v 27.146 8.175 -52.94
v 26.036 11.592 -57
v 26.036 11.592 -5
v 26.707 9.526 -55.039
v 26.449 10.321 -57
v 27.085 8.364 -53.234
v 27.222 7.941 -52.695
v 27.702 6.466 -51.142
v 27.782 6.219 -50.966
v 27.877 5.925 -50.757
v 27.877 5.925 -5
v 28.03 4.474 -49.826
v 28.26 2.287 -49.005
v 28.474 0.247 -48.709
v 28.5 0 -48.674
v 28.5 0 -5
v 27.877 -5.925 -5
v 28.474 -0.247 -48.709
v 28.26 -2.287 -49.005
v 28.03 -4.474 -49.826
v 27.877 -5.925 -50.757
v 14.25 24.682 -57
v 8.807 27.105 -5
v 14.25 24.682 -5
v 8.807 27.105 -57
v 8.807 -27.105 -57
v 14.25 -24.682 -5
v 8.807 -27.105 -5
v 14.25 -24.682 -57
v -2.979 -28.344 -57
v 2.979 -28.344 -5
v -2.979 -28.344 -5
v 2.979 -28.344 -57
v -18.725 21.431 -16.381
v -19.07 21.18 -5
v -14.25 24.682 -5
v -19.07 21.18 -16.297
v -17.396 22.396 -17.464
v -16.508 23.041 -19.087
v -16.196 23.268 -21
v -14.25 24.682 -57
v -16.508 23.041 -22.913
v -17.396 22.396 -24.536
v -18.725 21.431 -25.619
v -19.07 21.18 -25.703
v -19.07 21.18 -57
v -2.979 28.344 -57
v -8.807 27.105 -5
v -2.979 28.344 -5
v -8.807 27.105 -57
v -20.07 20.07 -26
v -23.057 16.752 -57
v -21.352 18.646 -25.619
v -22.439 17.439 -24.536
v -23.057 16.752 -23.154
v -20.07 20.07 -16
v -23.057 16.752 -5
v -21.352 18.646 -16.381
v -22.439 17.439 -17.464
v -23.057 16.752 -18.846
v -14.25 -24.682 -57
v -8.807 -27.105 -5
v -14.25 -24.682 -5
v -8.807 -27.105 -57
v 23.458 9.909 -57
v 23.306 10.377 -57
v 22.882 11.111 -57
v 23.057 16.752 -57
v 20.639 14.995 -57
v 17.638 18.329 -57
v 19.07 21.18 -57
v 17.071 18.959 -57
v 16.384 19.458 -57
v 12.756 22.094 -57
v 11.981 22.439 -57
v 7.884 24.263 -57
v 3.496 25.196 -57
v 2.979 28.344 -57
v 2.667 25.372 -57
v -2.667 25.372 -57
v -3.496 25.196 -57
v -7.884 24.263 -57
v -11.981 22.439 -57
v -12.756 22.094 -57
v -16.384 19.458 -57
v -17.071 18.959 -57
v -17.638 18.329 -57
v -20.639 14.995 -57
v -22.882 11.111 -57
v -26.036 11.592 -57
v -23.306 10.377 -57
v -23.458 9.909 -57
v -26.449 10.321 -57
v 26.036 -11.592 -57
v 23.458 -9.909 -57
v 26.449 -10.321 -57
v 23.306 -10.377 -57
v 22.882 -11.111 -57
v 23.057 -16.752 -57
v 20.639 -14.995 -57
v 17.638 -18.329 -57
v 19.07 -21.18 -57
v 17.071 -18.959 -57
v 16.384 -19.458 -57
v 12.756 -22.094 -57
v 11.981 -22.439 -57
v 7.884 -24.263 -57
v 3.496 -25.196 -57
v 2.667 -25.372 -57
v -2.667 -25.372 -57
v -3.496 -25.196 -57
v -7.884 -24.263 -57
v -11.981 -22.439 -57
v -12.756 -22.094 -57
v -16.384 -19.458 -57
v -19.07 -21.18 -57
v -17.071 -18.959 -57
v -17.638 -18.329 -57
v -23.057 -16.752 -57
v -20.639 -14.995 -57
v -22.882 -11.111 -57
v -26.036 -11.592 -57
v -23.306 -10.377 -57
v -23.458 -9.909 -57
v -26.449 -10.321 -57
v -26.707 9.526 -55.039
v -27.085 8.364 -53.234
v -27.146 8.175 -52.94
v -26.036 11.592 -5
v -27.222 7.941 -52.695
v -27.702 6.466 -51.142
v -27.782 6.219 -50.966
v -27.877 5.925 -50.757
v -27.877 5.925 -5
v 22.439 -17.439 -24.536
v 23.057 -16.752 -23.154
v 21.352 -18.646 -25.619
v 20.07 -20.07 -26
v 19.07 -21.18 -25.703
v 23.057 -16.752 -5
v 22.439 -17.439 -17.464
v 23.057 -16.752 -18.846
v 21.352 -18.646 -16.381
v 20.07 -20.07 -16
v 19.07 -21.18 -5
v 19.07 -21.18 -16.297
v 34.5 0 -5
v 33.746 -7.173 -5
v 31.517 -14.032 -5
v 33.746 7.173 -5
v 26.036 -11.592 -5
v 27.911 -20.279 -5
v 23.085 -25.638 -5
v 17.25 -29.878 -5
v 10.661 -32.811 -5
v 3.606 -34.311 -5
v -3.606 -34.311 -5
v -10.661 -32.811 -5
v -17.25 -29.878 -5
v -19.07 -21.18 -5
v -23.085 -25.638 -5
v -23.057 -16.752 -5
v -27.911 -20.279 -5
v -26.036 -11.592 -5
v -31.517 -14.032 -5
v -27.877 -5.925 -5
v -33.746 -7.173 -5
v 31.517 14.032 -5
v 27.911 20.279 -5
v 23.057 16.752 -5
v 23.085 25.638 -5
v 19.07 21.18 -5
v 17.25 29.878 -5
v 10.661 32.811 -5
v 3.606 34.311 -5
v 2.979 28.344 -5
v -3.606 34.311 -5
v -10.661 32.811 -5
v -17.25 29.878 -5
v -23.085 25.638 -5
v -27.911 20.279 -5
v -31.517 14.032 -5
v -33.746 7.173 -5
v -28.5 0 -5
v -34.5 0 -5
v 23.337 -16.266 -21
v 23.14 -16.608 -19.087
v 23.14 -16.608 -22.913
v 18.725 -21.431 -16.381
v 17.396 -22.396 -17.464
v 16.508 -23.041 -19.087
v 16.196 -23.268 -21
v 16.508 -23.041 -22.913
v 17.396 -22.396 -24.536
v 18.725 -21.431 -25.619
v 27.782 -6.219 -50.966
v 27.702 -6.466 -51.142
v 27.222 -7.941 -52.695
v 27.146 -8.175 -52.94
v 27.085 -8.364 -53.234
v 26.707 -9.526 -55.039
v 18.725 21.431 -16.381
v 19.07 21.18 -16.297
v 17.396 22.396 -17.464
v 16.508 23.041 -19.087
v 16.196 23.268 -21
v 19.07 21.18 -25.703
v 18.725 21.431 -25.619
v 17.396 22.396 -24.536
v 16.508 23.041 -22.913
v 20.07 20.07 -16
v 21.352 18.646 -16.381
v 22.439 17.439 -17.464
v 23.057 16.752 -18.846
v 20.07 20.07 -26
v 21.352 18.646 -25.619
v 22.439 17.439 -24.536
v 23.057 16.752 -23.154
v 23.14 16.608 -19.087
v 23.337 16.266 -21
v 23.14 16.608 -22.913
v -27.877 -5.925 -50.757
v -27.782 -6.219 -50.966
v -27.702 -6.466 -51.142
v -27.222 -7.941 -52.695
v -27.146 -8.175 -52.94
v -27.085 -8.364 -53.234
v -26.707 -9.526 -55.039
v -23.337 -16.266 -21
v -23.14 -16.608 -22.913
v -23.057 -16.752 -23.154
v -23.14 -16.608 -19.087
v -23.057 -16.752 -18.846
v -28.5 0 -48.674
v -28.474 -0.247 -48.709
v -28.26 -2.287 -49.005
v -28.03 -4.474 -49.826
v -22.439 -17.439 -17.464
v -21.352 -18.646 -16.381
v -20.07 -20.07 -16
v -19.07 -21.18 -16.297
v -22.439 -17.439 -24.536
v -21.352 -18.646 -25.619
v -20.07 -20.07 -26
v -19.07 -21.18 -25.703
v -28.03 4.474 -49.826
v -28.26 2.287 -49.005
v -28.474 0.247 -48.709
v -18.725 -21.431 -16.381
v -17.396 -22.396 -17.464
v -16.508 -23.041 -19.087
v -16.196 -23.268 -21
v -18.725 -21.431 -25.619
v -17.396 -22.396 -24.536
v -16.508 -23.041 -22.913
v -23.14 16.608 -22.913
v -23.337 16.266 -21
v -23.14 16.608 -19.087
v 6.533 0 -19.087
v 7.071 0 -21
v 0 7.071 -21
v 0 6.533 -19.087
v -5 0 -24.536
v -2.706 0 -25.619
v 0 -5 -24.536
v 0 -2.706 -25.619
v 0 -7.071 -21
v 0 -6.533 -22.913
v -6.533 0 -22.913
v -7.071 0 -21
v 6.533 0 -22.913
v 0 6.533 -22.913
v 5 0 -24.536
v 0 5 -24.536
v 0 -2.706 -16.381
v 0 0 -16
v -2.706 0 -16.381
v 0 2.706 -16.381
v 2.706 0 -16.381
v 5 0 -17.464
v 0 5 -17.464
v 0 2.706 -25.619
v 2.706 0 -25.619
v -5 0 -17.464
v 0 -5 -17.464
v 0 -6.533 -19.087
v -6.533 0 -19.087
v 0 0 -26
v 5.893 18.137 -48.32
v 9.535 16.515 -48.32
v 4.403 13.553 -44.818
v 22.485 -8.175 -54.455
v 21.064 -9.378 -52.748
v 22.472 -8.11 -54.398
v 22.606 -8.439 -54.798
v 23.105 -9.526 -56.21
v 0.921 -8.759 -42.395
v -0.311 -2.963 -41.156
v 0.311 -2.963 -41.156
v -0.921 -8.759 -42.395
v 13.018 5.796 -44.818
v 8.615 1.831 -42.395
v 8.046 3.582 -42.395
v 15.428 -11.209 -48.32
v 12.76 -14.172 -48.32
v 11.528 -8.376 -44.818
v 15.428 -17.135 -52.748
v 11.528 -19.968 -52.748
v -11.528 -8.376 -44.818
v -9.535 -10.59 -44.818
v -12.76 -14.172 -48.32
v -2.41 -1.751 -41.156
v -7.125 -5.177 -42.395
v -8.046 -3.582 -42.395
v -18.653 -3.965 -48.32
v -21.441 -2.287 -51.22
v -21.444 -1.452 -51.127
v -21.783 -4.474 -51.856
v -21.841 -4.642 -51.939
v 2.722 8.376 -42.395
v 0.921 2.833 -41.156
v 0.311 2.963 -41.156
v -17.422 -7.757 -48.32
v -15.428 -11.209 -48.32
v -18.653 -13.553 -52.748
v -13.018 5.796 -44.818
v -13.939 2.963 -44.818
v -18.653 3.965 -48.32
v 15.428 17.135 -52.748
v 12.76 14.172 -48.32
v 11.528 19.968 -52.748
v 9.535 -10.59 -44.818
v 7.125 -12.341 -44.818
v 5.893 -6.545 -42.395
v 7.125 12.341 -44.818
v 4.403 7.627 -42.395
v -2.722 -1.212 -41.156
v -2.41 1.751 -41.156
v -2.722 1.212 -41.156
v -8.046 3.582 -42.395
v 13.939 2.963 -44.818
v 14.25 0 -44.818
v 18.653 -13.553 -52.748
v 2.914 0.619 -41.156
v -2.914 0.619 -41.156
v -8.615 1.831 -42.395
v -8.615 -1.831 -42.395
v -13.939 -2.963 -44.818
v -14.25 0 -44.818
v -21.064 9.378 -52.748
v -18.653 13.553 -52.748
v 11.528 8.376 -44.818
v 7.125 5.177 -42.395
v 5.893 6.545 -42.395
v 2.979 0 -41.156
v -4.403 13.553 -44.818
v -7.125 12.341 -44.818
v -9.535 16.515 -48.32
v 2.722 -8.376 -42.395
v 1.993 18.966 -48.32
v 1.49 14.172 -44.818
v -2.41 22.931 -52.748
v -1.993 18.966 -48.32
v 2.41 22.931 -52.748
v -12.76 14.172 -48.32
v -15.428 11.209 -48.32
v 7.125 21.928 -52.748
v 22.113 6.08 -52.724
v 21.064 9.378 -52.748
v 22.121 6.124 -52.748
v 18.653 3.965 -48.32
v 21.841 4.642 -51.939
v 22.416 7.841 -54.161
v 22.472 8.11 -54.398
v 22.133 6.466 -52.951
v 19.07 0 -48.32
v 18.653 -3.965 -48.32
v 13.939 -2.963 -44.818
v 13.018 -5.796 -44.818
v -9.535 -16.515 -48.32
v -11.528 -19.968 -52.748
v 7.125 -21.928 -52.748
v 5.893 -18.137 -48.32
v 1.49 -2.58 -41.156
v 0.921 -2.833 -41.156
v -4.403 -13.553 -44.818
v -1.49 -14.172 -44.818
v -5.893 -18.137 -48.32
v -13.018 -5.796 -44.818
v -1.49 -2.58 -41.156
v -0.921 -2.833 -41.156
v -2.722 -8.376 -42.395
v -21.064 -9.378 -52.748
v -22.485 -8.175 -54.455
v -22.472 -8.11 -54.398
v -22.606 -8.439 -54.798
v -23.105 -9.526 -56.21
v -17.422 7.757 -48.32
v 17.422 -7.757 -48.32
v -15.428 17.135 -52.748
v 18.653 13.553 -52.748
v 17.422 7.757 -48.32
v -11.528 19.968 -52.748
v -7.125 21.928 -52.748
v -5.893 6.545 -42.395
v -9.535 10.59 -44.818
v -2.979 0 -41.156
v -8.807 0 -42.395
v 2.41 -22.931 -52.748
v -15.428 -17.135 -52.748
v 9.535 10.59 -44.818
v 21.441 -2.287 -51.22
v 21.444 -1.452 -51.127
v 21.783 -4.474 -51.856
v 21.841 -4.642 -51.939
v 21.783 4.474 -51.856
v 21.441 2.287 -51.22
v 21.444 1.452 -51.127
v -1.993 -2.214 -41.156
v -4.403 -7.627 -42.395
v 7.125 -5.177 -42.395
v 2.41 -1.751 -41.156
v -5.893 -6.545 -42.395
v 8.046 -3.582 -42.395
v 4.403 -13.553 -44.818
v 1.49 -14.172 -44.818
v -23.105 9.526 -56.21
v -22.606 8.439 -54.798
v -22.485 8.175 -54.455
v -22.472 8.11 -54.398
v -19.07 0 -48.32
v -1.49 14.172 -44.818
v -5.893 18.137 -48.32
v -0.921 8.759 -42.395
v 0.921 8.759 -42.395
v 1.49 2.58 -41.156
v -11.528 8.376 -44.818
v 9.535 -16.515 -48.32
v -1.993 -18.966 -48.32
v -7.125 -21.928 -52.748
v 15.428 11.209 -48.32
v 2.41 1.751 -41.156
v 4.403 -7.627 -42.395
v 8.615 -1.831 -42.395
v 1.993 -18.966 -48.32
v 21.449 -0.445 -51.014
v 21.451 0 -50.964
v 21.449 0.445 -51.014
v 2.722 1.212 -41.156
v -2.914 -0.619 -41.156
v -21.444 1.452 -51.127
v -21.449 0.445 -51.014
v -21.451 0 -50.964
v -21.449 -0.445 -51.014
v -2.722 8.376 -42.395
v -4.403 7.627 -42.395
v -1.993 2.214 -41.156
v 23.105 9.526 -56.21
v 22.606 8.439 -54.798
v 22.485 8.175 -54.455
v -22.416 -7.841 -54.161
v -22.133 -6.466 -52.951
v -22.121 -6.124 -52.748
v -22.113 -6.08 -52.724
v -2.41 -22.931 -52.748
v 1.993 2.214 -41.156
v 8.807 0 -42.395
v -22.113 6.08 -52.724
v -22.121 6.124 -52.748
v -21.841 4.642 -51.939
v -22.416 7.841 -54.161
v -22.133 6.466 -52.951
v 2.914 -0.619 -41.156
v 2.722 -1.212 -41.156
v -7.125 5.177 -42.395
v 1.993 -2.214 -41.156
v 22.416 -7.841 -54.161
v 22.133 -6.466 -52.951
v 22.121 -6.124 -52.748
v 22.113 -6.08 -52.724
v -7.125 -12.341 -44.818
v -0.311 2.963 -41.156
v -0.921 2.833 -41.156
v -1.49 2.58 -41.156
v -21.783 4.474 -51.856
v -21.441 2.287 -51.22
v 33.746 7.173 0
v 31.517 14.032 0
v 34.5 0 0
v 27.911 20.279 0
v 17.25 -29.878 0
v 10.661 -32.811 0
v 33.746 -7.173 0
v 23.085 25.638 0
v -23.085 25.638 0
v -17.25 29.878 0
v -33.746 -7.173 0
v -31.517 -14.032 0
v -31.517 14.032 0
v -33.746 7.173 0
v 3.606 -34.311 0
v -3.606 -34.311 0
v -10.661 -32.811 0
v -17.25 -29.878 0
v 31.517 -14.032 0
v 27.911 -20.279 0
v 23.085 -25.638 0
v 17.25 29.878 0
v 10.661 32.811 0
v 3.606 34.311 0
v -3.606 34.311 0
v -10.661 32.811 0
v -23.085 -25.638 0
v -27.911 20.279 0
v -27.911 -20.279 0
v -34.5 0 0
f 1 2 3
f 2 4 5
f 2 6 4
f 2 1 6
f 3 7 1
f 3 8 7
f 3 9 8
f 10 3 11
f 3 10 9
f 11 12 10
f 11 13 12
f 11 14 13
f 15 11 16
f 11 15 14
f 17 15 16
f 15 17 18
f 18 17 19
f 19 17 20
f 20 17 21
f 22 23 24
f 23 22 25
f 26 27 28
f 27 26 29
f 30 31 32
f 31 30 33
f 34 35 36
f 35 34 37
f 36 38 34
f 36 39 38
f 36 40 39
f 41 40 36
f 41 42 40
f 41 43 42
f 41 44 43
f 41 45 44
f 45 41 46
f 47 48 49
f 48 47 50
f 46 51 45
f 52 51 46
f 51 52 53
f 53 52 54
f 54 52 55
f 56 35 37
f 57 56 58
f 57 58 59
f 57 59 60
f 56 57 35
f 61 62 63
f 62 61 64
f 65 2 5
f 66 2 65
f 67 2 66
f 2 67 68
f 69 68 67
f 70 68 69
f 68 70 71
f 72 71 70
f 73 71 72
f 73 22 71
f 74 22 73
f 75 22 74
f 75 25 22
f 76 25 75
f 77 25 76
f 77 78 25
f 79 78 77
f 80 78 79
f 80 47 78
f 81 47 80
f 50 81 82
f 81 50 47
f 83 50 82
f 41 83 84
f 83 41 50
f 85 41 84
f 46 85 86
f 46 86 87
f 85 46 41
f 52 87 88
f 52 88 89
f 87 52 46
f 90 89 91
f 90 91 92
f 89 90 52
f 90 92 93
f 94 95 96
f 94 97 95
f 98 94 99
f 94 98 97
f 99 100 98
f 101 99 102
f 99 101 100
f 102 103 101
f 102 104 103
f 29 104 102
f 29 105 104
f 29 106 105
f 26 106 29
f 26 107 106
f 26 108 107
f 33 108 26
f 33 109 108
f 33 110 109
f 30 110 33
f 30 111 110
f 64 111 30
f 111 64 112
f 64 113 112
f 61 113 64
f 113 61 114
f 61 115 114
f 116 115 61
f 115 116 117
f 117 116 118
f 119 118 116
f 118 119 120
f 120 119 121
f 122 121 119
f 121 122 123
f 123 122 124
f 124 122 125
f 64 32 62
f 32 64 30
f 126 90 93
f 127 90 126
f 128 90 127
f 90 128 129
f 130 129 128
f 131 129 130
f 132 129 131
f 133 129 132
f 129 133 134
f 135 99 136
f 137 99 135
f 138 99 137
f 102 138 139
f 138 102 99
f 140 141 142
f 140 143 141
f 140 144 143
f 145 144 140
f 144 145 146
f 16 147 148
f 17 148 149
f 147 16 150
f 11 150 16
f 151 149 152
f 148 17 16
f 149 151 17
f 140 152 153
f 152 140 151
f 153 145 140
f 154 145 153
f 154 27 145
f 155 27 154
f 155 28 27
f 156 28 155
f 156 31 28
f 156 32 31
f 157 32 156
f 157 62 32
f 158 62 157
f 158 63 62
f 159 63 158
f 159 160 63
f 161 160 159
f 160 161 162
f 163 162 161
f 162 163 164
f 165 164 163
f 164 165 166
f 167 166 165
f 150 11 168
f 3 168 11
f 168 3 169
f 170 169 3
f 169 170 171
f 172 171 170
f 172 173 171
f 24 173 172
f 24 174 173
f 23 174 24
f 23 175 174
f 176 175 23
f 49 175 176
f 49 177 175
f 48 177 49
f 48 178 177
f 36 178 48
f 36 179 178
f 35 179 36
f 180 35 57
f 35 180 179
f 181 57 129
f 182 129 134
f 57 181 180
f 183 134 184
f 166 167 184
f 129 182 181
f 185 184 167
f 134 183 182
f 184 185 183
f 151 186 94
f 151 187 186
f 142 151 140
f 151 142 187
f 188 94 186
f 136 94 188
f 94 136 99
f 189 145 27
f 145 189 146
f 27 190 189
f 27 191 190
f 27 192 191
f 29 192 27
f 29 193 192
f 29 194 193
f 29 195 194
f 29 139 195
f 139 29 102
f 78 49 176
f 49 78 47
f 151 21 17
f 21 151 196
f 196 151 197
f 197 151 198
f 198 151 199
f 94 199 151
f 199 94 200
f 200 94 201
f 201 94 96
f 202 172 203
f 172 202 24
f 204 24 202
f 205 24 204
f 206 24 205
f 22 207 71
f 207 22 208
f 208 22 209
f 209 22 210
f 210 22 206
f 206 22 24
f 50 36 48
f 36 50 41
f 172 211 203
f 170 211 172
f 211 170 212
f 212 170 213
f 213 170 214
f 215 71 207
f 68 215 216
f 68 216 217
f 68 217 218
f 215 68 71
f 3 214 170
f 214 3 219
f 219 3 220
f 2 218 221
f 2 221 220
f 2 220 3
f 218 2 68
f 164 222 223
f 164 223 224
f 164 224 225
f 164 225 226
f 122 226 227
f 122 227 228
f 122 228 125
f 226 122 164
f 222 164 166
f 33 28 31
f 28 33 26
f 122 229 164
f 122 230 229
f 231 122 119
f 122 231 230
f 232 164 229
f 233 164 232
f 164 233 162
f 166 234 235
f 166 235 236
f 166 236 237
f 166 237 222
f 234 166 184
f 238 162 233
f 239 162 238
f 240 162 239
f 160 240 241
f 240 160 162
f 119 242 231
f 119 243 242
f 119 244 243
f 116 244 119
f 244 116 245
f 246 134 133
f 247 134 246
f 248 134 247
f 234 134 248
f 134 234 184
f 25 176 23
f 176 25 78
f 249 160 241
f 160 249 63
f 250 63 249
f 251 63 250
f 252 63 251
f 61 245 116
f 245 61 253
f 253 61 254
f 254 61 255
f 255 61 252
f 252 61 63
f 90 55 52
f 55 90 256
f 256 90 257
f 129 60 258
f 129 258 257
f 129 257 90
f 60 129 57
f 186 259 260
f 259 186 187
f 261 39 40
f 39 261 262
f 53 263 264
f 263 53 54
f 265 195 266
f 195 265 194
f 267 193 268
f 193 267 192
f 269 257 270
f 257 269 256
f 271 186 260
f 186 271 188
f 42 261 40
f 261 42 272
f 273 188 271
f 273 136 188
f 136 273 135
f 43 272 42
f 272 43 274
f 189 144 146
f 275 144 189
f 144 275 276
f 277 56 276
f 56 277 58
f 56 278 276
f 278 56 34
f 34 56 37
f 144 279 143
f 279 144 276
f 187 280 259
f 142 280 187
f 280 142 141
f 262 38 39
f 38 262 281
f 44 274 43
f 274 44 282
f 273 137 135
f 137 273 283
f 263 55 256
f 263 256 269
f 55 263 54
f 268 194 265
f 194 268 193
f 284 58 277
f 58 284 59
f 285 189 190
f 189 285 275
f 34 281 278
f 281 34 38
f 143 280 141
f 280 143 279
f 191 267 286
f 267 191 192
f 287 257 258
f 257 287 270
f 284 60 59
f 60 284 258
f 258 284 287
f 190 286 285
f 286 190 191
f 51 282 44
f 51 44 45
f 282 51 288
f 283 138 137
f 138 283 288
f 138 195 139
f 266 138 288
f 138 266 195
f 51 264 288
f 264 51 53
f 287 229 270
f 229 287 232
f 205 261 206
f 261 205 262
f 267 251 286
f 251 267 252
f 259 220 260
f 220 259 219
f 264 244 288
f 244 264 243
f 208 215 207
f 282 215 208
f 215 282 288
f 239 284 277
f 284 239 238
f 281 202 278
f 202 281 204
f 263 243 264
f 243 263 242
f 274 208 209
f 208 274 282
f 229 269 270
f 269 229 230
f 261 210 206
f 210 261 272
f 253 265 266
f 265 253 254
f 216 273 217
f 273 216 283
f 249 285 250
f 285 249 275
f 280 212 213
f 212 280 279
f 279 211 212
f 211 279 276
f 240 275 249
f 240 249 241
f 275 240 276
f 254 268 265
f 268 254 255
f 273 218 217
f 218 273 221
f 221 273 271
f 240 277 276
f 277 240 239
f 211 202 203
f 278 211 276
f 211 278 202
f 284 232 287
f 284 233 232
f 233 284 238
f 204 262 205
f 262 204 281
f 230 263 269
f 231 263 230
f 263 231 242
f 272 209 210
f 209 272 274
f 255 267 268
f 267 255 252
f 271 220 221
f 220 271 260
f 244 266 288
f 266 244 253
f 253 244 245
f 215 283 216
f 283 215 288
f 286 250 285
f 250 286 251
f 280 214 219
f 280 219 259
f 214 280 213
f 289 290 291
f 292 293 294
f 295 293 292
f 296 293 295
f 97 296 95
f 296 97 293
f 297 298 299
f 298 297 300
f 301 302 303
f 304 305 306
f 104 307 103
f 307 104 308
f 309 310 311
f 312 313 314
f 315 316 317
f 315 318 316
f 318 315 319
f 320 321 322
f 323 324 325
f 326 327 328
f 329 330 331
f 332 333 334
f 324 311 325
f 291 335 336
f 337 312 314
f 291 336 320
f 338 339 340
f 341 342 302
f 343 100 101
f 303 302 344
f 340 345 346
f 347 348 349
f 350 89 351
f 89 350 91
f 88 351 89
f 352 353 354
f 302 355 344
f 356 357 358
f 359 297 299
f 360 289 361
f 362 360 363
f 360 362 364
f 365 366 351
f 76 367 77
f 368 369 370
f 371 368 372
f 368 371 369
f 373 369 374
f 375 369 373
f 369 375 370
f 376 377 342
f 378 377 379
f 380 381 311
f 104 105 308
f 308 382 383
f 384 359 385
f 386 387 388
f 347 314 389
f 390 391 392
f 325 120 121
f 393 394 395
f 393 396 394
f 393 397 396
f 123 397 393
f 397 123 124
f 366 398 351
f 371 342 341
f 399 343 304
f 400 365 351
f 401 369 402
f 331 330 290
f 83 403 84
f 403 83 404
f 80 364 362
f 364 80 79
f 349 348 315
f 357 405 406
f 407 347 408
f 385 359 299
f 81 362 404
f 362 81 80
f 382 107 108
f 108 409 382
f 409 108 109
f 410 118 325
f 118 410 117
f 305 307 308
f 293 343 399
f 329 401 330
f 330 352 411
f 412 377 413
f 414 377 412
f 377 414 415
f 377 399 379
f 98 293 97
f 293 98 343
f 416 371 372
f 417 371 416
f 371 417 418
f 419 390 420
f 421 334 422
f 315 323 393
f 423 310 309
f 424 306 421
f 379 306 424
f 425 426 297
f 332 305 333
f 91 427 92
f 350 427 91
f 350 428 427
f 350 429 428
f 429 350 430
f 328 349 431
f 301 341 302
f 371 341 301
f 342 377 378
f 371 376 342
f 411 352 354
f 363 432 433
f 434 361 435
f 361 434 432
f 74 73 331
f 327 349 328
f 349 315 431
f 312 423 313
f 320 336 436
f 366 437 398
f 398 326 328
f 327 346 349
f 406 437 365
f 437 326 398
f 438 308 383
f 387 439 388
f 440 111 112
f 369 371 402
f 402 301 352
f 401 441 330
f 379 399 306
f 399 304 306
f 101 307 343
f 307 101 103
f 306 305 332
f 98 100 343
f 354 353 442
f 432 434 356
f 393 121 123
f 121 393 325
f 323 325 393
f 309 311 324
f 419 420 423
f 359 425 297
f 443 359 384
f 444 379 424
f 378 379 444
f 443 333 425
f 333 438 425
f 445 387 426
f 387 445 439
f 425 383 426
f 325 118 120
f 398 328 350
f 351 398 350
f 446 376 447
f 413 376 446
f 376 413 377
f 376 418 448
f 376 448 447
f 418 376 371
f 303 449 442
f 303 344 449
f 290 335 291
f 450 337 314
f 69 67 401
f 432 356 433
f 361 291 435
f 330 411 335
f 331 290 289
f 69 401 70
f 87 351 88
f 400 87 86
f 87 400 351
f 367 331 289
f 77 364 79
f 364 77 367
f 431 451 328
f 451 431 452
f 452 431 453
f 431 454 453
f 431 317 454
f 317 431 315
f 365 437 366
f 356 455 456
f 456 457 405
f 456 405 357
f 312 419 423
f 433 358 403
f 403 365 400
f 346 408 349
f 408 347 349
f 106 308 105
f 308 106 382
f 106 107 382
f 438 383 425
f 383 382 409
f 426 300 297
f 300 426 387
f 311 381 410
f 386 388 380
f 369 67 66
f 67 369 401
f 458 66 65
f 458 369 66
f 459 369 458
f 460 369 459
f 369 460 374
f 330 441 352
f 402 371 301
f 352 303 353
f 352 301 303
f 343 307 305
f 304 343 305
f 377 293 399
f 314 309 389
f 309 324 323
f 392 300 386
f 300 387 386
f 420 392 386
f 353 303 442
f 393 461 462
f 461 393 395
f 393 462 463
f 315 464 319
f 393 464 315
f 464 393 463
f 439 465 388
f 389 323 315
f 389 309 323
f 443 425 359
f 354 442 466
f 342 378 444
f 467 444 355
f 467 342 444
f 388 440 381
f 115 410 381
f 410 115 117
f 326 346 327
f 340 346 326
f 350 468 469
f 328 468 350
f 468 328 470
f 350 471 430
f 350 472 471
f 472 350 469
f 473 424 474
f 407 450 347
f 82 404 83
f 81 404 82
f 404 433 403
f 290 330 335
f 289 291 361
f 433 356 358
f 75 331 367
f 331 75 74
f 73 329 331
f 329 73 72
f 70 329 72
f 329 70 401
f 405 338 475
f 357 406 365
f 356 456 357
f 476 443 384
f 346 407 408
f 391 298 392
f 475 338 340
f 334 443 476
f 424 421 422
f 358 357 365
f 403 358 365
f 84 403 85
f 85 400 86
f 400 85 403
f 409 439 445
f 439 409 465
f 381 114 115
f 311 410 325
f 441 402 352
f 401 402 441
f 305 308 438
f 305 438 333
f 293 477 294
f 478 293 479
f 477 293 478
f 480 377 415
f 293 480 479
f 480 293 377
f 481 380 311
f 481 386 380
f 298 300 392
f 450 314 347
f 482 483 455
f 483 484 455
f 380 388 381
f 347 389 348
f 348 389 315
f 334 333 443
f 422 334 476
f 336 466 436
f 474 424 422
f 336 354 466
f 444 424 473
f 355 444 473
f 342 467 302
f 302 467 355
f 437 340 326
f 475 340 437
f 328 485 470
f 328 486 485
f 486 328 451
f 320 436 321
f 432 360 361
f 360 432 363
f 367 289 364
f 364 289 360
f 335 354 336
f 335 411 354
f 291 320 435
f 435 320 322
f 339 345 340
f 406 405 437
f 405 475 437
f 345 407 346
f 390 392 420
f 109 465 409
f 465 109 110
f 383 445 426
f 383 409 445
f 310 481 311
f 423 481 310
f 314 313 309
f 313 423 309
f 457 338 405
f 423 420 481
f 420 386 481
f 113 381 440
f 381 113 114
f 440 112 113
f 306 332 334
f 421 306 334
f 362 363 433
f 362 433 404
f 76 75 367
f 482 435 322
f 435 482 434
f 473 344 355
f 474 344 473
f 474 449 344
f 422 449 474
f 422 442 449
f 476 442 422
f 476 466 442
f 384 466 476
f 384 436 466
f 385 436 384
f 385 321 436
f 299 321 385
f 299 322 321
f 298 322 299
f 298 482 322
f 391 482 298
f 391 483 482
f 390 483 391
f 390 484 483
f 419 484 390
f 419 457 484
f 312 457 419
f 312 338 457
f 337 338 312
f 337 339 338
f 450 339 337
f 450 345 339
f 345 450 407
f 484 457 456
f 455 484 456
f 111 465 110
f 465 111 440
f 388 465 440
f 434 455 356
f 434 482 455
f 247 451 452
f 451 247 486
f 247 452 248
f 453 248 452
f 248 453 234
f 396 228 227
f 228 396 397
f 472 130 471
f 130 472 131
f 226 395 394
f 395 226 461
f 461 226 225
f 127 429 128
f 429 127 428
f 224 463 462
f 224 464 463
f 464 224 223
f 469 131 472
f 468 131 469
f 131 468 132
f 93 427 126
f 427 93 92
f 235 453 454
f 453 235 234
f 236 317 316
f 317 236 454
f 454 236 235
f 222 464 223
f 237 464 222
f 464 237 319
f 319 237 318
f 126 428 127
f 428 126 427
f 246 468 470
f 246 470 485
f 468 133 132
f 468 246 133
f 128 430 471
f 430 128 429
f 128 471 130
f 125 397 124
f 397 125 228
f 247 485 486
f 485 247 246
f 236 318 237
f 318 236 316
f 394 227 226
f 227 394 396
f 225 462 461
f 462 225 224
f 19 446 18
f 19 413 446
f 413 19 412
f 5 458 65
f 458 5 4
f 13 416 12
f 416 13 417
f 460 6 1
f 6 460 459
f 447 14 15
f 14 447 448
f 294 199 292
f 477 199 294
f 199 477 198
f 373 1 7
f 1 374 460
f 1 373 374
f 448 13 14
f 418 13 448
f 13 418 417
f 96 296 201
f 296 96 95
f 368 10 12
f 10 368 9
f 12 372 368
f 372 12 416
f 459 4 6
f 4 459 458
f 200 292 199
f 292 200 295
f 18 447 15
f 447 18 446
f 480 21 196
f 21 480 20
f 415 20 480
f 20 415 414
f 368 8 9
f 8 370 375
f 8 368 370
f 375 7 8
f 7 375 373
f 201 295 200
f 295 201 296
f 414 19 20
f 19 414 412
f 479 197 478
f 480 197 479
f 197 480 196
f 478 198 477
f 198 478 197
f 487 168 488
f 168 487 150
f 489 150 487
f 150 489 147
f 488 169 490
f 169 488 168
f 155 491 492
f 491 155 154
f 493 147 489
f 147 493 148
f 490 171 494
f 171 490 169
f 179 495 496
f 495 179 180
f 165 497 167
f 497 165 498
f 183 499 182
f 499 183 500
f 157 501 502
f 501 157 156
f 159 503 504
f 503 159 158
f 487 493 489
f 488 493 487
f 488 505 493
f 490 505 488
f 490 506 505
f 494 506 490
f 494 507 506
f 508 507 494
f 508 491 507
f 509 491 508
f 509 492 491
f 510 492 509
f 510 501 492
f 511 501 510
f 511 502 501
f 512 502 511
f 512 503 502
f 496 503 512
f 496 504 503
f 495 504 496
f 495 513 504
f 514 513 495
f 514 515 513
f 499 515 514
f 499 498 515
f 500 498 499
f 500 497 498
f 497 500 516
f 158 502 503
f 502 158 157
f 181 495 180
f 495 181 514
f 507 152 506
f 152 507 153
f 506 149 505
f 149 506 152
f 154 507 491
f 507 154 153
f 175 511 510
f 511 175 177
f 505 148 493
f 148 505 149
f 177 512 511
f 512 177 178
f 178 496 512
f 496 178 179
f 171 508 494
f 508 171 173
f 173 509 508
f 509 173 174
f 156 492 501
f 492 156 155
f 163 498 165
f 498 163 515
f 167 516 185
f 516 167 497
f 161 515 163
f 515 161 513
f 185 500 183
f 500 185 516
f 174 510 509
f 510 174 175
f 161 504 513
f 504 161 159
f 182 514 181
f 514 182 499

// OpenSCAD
Shpor();

/*

    Расстояние от верха шпора до центра вырезанной сферы: 69.5
    = shporH + shimH + sphereOffset



*/

shporH = 52;
shimH = 5;
shporDia = 57;
holeDia = 10;
mastDia = 69;

sphereDia = 57;
cutCylDia = 22;

// На сколько ниже центр вырезанной сферы 
// Нижней грани шпора 
sphereOffset = 12.5;                    


module Shpor() {

    translate([0,0,-shporH/2-5])  
    {

    difference() {
        cylinder(h=shporH,d=shporDia,center=true);
    
        dz = shporH/2-holeDia/2 -11;

        translate([0,0,dz]) rotate([0,0,45]) rotate([90,0,0]) cylinder(h=shporDia+10,d=holeDia,center=true);
        translate([0,0,dz]) rotate([0,0,-45]) rotate([90,0,0]) cylinder(h=shporDia+10,d=holeDia,center=true);

        translate([0,0,-sphereOffset -shporH/2]) sphere(d = sphereDia);    




        tempH = sphereDia*1.5;
        tempdz = - shporH/2 - sphereOffset;
        translate([0,0, tempdz])     rotate([0,-72,0]) cylinder(h=tempH,d=cutCylDia,center=true);
        translate([0,0, tempdz])     rotate([0, 72,0]) cylinder(h=tempH,d=cutCylDia,center=true);

    }
    
    translate([0,0,shimH/2 + shporH/2]) cylinder(h=shimH,d=mastDia,center=true);
    

    }


}
